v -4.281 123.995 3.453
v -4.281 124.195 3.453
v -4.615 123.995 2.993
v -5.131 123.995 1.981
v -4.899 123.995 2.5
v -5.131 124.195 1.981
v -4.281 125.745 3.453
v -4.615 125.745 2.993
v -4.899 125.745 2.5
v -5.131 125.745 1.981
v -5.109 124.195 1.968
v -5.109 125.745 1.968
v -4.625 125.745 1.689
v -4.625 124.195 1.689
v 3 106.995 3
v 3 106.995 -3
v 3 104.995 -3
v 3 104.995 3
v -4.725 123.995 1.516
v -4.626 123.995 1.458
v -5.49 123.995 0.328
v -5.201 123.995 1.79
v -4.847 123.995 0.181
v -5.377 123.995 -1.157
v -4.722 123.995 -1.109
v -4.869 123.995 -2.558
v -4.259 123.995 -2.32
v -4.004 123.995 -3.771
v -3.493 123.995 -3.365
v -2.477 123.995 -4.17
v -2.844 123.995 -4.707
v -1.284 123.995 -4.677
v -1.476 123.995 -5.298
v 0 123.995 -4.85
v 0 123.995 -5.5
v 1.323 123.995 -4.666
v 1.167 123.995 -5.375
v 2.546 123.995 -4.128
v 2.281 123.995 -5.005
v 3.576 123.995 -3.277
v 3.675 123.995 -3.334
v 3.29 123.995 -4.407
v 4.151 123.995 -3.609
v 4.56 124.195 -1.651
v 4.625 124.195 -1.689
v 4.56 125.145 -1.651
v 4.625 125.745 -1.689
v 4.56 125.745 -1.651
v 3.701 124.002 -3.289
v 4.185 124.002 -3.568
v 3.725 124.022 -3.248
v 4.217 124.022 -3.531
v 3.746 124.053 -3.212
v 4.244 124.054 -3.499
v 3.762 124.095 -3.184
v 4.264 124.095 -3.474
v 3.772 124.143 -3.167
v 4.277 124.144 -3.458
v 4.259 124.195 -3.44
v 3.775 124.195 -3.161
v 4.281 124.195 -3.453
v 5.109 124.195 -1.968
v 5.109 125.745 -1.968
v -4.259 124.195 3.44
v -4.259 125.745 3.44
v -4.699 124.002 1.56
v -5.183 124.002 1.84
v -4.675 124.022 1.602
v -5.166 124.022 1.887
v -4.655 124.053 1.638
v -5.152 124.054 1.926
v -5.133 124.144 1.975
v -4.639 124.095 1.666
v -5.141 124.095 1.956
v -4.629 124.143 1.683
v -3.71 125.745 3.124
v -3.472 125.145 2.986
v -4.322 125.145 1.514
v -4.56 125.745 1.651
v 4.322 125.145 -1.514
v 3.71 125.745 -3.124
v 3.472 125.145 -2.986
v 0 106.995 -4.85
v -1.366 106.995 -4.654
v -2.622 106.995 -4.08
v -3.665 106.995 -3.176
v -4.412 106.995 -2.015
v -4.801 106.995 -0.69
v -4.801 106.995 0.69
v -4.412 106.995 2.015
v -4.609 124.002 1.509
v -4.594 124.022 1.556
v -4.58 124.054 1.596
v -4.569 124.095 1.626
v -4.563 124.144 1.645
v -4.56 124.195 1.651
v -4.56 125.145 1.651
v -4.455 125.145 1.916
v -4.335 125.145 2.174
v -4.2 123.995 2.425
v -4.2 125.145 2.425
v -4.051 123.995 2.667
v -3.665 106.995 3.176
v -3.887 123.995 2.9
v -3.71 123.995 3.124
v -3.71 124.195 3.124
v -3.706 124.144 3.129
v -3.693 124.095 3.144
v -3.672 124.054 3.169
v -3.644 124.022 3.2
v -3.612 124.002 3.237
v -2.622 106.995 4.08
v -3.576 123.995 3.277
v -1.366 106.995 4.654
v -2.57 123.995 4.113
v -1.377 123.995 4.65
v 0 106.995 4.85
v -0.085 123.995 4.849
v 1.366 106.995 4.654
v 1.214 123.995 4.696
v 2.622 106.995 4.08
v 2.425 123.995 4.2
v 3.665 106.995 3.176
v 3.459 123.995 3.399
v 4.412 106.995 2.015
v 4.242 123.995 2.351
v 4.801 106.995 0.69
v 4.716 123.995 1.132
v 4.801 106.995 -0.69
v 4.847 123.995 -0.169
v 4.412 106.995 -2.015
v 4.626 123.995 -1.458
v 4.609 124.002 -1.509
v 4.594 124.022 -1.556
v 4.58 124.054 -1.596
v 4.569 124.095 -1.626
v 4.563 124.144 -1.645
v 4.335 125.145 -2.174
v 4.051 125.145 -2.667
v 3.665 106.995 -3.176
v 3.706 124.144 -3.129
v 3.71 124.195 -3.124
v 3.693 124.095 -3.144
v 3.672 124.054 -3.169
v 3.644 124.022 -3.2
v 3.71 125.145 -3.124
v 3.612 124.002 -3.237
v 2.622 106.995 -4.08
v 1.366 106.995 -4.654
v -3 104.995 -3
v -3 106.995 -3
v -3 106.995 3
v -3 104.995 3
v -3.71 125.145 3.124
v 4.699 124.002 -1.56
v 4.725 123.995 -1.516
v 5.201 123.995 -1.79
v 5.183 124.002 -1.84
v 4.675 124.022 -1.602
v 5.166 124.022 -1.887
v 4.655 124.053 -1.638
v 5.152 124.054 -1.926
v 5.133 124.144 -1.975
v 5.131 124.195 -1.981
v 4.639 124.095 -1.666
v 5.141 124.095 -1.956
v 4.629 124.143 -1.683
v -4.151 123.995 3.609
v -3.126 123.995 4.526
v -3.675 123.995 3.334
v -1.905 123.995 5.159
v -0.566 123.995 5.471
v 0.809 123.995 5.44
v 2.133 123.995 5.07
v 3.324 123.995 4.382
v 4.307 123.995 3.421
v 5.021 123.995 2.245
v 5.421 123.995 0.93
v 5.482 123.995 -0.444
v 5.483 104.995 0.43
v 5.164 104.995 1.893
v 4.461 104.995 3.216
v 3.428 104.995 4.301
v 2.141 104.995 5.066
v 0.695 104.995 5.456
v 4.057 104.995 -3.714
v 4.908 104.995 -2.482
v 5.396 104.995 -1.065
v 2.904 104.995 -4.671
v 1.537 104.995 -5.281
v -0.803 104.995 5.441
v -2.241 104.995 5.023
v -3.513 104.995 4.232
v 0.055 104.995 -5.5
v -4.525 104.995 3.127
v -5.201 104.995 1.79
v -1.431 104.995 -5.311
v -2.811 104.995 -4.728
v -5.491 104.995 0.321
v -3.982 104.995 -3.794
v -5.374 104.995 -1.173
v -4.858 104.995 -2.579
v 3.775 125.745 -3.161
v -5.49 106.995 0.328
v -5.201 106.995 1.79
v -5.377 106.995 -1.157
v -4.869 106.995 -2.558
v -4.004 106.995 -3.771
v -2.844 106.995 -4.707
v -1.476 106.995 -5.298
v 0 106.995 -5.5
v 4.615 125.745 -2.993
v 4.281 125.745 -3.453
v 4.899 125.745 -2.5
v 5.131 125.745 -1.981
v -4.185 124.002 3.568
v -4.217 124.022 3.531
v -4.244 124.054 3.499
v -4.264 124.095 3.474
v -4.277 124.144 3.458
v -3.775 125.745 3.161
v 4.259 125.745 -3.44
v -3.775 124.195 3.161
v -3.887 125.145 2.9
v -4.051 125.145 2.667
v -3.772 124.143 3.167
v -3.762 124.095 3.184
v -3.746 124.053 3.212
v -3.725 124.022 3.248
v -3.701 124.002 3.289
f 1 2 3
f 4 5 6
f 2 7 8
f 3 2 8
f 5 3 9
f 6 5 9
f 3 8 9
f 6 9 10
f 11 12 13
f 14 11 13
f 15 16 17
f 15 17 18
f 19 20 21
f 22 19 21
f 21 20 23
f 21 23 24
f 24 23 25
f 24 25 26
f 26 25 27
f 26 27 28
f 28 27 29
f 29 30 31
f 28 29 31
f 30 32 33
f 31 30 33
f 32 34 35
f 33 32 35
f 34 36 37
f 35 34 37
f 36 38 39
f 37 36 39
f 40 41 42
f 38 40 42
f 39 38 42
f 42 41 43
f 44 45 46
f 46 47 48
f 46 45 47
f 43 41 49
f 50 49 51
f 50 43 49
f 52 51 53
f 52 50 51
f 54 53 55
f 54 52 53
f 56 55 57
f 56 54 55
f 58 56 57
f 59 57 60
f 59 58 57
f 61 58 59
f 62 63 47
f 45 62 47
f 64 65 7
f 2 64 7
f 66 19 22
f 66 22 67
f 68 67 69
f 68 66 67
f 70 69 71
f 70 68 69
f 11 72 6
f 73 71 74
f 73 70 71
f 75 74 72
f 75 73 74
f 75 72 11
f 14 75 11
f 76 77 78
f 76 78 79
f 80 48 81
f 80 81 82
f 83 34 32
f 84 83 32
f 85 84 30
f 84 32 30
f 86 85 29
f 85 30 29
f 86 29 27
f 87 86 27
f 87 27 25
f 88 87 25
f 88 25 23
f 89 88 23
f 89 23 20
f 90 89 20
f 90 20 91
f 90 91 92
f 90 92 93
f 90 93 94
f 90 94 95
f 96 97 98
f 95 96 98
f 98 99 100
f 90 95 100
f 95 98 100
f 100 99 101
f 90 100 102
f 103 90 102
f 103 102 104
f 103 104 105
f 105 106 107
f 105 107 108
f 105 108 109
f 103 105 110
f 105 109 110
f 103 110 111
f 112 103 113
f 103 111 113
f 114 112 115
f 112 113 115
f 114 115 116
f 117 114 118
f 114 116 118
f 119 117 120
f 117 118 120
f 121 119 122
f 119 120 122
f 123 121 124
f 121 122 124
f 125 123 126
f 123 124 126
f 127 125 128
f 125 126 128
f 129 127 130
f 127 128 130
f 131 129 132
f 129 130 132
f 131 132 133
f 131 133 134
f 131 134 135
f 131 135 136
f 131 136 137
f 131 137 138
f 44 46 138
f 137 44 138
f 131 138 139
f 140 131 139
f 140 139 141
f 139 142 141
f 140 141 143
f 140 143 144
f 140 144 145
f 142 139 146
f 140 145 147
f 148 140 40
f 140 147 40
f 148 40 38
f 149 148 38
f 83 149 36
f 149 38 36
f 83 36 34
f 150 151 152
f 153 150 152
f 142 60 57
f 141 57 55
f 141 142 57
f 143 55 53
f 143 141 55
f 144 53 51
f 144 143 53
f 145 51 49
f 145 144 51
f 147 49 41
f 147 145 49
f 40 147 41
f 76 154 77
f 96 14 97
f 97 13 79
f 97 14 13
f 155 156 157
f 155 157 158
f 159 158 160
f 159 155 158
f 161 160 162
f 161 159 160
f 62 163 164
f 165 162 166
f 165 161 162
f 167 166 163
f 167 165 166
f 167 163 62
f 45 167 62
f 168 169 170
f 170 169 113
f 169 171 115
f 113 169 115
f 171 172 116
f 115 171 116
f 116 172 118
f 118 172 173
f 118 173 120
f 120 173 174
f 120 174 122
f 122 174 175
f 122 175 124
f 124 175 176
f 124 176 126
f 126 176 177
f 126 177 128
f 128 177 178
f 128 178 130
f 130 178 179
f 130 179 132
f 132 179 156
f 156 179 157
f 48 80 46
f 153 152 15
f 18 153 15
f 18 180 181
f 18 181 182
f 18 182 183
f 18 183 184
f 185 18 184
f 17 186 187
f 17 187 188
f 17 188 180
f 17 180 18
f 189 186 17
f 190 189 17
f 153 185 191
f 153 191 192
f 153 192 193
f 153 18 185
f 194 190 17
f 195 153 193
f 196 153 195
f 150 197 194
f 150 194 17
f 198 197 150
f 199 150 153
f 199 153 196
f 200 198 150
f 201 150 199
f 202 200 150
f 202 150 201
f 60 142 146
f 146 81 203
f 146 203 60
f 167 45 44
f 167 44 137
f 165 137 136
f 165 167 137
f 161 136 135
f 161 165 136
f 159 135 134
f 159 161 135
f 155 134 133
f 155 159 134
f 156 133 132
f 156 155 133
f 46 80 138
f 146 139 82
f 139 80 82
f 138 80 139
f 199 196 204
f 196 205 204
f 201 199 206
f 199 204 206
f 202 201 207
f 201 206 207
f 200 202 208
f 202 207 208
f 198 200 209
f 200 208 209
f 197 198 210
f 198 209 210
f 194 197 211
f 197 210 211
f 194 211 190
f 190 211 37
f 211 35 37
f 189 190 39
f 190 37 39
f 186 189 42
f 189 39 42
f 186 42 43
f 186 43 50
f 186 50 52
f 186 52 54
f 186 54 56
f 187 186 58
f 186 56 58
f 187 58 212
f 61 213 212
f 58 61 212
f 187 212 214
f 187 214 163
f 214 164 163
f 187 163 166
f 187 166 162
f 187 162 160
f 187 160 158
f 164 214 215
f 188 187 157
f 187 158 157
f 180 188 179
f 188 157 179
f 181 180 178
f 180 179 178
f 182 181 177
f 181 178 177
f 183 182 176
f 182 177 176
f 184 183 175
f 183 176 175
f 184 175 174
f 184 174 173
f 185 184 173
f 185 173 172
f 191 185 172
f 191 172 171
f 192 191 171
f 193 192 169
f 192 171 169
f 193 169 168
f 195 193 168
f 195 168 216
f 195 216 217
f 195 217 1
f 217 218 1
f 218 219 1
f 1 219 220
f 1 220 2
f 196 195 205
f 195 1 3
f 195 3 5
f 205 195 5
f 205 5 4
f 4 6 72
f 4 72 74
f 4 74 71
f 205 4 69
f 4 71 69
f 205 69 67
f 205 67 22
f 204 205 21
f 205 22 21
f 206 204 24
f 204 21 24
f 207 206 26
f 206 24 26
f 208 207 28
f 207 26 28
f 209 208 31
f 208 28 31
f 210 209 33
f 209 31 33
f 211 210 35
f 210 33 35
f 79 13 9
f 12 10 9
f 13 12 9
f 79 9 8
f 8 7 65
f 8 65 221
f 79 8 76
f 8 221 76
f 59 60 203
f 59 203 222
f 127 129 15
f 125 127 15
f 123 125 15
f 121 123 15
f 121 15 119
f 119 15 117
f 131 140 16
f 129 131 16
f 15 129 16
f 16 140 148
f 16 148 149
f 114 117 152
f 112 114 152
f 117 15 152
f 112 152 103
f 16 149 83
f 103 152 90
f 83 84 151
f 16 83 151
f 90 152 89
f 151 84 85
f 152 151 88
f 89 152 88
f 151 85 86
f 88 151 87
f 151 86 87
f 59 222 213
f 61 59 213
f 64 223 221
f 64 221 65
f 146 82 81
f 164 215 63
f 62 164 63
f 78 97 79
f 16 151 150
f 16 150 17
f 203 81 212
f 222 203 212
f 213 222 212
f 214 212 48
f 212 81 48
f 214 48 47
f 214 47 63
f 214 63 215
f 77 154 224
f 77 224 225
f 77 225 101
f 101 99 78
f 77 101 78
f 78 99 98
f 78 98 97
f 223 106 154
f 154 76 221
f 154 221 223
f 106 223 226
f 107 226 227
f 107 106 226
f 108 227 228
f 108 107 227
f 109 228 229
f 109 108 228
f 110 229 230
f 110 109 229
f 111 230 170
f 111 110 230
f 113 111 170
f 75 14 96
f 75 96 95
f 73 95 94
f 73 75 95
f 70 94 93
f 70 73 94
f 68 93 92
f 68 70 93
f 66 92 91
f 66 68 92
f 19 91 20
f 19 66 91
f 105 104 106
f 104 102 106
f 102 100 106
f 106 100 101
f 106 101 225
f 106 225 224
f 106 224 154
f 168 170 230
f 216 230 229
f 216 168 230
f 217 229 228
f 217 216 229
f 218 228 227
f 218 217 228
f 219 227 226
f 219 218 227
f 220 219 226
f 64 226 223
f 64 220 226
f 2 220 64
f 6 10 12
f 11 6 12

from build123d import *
from build123d.topology import SkipClean

# Parameters (mm, degrees)
SKETCH1_R                = 5.5
SKETCH1_R_2              = 4.85
BOSS_EXTRUDE1_DEPTH      = 17
BOSS_EXTRUDE2_START      = -1.75
BOSS_EXTRUDE2_DEPTH      = 1.75
BOSS_EXTRUDE3_DEPTH      = 1.7
BOSS_EXTRUDE3_2_DEPTH    = 1.7
BOSS_EXTRUDE4_REACH      = 128.36
BOSS_EXTRUDE4_END_RADIUS = 4.85
SKETCH3_W                = 1.7
SKETCH3_H                = 0.6
BOSS_EXTRUDE5_START      = -9.624935
SKETCH3_2_W              = 1.7
SKETCH3_2_H              = 0.6
BOSS_EXTRUDE5_DEPTH      = 0.075066
FILLET1_R                = 0.2
BOSS_EXTRUDE6_START      = 17
SKETCH1_4_R              = 5.5
SKETCH1_4_W              = 6
SKETCH1_4_H              = 6
BOSS_EXTRUDE6_DEPTH      = 2


with BuildPart() as part:
    # Sketch1 → Boss-Extrude1 (new body)
    with BuildSketch(Plane.XZ.offset(-123.994845224)):
        with Locations(Location((0, 0, 0), (0, 0, 270))):
            Circle(SKETCH1_R)
        with Locations(Location((0, 0, 0), (0, 0, 270))):
            Circle(SKETCH1_R_2, mode=Mode.SUBTRACT)
    extrude(amount=BOSS_EXTRUDE1_DEPTH)

    # Sketch1<3> → Boss-Extrude2 (add)
    with SkipClean():  # the faces are left unmerged after this step: merging them gives an invalid solid
        with BuildSketch(Plane.XZ.offset(-123.994845224).offset(BOSS_EXTRUDE2_START)):
            with BuildLine():
                ThreePointArc((4.280924301, -3.453069233), (4.763148058, -2.74998556), (5.130919838, -1.98082347))
                Line((5.130919838, -1.98082347), (5.108754465, -1.968026376))
                Line((5.108754465, -1.968026376), (4.625228328, -1.688864385))
                Line((4.625228328, -1.688864385), (4.20023564, -2.424978467))
                Line((4.20023564, -2.424978467), (3.775232792, -3.161110148))
                Line((3.775232792, -3.161110148), (4.258758928, -3.440272139))
                Line((4.258758928, -3.440272139), (4.280924301, -3.453069233))
            make_face()
            with BuildLine():
                Line((-3.775232792, 3.161110148), (-4.258758928, 3.440272139))
                Line((-4.258758928, 3.440272139), (-4.280924301, 3.453069233))
                ThreePointArc((-4.280924301, 3.453069233), (-4.763148058, 2.74998556), (-5.130919838, 1.98082347))
                Line((-5.130919838, 1.98082347), (-5.108754465, 1.968026376))
                Line((-5.108754465, 1.968026376), (-4.625228328, 1.688864385))
                Line((-4.625228328, 1.688864385), (-4.200235262, 2.424979122))
                Line((-4.200235262, 2.424979122), (-3.775232792, 3.161110148))
            make_face()
            with BuildLine():
                Line((4.625228328, -1.688864385), (4.560219632, -1.651331859))
                ThreePointArc((4.560219632, -1.651331859), (4.397274885, -2.046087385), (4.20023564, -2.424978467))
                Line((4.20023564, -2.424978467), (4.625228328, -1.688864385))
            make_face()
            with BuildLine():
                ThreePointArc((4.20023564, -2.424978467), (3.970623818, -2.785075672), (3.710224095, -3.123577623))
                Line((3.710224095, -3.123577623), (3.775232792, -3.161110148))
                Line((3.775232792, -3.161110148), (4.20023564, -2.424978467))
            make_face()
            with BuildLine():
                ThreePointArc((-4.560219632, 1.651331859), (-4.397274725, 2.046087728), (-4.200235262, 2.424979122))
                Line((-4.200235262, 2.424979122), (-4.625228328, 1.688864385))
                Line((-4.625228328, 1.688864385), (-4.560219632, 1.651331859))
            make_face()
            with BuildLine():
                Line((-3.710224095, 3.123577623), (-3.775232792, 3.161110148))
                Line((-3.775232792, 3.161110148), (-4.200235262, 2.424979122))
                ThreePointArc((-4.200235262, 2.424979122), (-3.970623601, 2.785075982), (-3.710224095, 3.123577623))
            make_face()
        extrude(amount=BOSS_EXTRUDE2_DEPTH)



with BuildPart() as body_2:
    # Sketch2 → Boss-Extrude3 (new body)
    with BuildSketch(Plane(origin=(0.424997768, 0, 0.736122882), x_dir=(0.866026919582721, 0, -0.49999737455117027), z_dir=(0.49999737455117027, 0, 0.866026919582721))):
        Polygon((4.5, 125.144845224), (4.774934555, 125.144845224), (4.774934555, 125.744845224), align=None)
    extrude(amount=-BOSS_EXTRUDE3_DEPTH)


with BuildPart() as body_3:
    # Sketch2 → Boss-Extrude3 2 (new body)
    with BuildSketch(Plane(origin=(0.424997768, 0, 0.736122882), x_dir=(0.866026919582721, 0, -0.49999737455117027), z_dir=(0.49999737455117027, 0, 0.866026919582721))):
        Polygon((-4.5, 125.144845224), (-4.774934555, 125.744845224), (-4.774934555, 125.144845224), align=None)
    extrude(amount=-BOSS_EXTRUDE3_2_DEPTH)


with BuildPart() as part_1:
    with SkipClean():  # the faces are left unmerged after this step: merging them gives an invalid solid
        add(part.part)

        add(body_2.part)  # Boss-Extrude4 merges body 2
        # Boss-Extrude4: up to this cylinder (the profile starts inside it)
        boss_extrude4_end = Plane(origin=(0, 125.444845, 0), z_dir=(0, 1, 0)) * Cylinder(BOSS_EXTRUDE4_END_RADIUS, 267.42, mode=Mode.PRIVATE)
        # Sketch3 → Boss-Extrude4 (add, up to the surface)
        with BuildSketch(Plane(origin=(4.135221863, 0, -2.387454741), x_dir=(-0.4999973745511703, 0, -0.866026919582721), z_dir=(0.866026919582721, 0, -0.4999973745511703)), mode=Mode.PRIVATE) as boss_extrude4_sk1:
            with Locations((0, 125.444845224)):
                Rectangle(SKETCH3_W, SKETCH3_H)
        boss_extrude4_tool1 = extrude(boss_extrude4_sk1.sketch, amount=BOSS_EXTRUDE4_REACH, mode=Mode.PRIVATE) & boss_extrude4_end
        add(boss_extrude4_tool1.solids().sort_by_distance((4.135222, 125.444845, -2.387455))[0])


    with SkipClean():  # the faces are left unmerged after this step: merging them gives an invalid solid
        add(body_3.part)  # Boss-Extrude5 merges body 3
        # Sketch3<2> → Boss-Extrude5 (add)
        with BuildSketch(Plane(origin=(4.135221863, 0, -2.387454741), x_dir=(-0.4999973745511703, 0, -0.866026919582721), z_dir=(0.866026919582721, 0, -0.4999973745511703)).offset(BOSS_EXTRUDE5_START)):
            with Locations((0, 125.444845224)):
                Rectangle(SKETCH3_2_W, SKETCH3_2_H)
        extrude(amount=BOSS_EXTRUDE5_DEPTH)

    # Fillet1
    # the kernel refuses this fillet: 0.2 mm, written as the material it adds along each edge
    with BuildSketch(Plane(origin=(-4.713937761, 123.994845224, 3.70306792), x_dir=(0.49999737455195337, 0, 0.866026919582269), z_dir=(0.866026919582269, 0, -0.4999973745519534))) as fillet1_piece_1_section:
        with BuildLine():
            CenterArc((FILLET1_R, -FILLET1_R), FILLET1_R, 90, 90)
            Line((0, -FILLET1_R), (0, 0))
            Line((0, 0), (FILLET1_R, 0))
        make_face()
    fillet1_piece_1 = extrude(amount=1.083921236, mode=Mode.PRIVATE)
    fillet1_piece_1 = fillet1_piece_1 & Plane(origin=(0, 124.040443489, 0), x_dir=(0, 0, -1), z_dir=(0, 1, 0)) * Cylinder(5.5, 3, mode=Mode.PRIVATE)
    add(fillet1_piece_1)
    with BuildSketch(Plane(origin=(4.713937761, 123.994845224, -3.70306792), x_dir=(-0.49999737455261106, 0, -0.8660269195818893), z_dir=(-0.8660269195818893, 0, 0.4999973745526111))) as fillet1_piece_2_section:
        with BuildLine():
            CenterArc((FILLET1_R, -FILLET1_R), FILLET1_R, 90, 90)
            Line((0, -FILLET1_R), (0, 0))
            Line((0, 0), (FILLET1_R, 0))
        make_face()
    fillet1_piece_2 = extrude(amount=1.083921236, mode=Mode.PRIVATE)
    fillet1_piece_2 = fillet1_piece_2 & Plane(origin=(0, 124.040443489, 0), x_dir=(0, 0, -1), z_dir=(0, 1, 0)) * Cylinder(5.5, 3, mode=Mode.PRIVATE)
    add(fillet1_piece_2)
    with BuildSketch(Plane(origin=(-4.625228328, 123.994845224, 1.688864385), x_dir=(-0.49999737454985904, 0, -0.866026919583478), z_dir=(-0.8660269195834781, 0, 0.49999737454985904))) as fillet1_piece_3_section:
        with BuildLine():
            CenterArc((FILLET1_R, -FILLET1_R), FILLET1_R, 90, 90)
            Line((0, -FILLET1_R), (0, 0))
            Line((0, 0), (FILLET1_R, 0))
        make_face()
    fillet1_piece_3 = extrude(amount=1.083921236, mode=Mode.PRIVATE)
    fillet1_piece_3 = fillet1_piece_3 & Plane(origin=(0, 124.040443489, 0), x_dir=(0, 0, -1), z_dir=(0, 1, 0)) * Cylinder(5.5, 3, mode=Mode.PRIVATE)
    add(fillet1_piece_3)
    with BuildSketch(Plane(origin=(4.625228328, 123.994845224, -1.688864385), x_dir=(0.4999973745501742, 0, 0.866026919583296), z_dir=(0.8660269195832961, 0, -0.49999737455017423))) as fillet1_piece_4_section:
        with BuildLine():
            CenterArc((FILLET1_R, -FILLET1_R), FILLET1_R, 90, 90)
            Line((0, -FILLET1_R), (0, 0))
            Line((0, 0), (FILLET1_R, 0))
        make_face()
    fillet1_piece_4 = extrude(amount=1.083921236, mode=Mode.PRIVATE)
    fillet1_piece_4 = fillet1_piece_4 & Plane(origin=(0, 124.040443489, 0), x_dir=(0, 0, -1), z_dir=(0, 1, 0)) * Cylinder(5.5, 3, mode=Mode.PRIVATE)
    add(fillet1_piece_4)
    with BuildSketch(Plane(origin=(4.625228328, 123.994845224, -1.688864385), x_dir=(0.4999973745511805, 0, 0.8660269195827152), z_dir=(-0.8660269195827152, 0, 0.49999737455118054))) as fillet1_piece_5_section:
        with BuildLine():
            CenterArc((FILLET1_R, FILLET1_R), FILLET1_R, 180, 90)
            Line((0, FILLET1_R), (0, 0))
            Line((0, 0), (FILLET1_R, 0))
        make_face()
    fillet1_piece_5 = extrude(amount=0.575065445, mode=Mode.PRIVATE)
    fillet1_piece_5 = fillet1_piece_5 - Plane(origin=(0, 124.037616214, 0), x_dir=(0, 0, -1), z_dir=(0, 1, 0)) * Cylinder(4.85, 2, mode=Mode.PRIVATE)
    add(fillet1_piece_5)
    with BuildSketch(Plane(origin=(-4.625228328, 123.994845224, 1.688864385), x_dir=(-0.49999737455107873, 0, -0.8660269195827739), z_dir=(0.8660269195827739, 0, -0.49999737455107884))) as fillet1_piece_6_section:
        with BuildLine():
            CenterArc((FILLET1_R, FILLET1_R), FILLET1_R, 180, 90)
            Line((0, FILLET1_R), (0, 0))
            Line((0, 0), (FILLET1_R, 0))
        make_face()
    fillet1_piece_6 = extrude(amount=0.575065445, mode=Mode.PRIVATE)
    fillet1_piece_6 = fillet1_piece_6 - Plane(origin=(0, 124.037616214, 0), x_dir=(0, 0, -1), z_dir=(0, 1, 0)) * Cylinder(4.85, 2, mode=Mode.PRIVATE)
    add(fillet1_piece_6)
    with BuildSketch(Plane(origin=(3.277210635, 123.994845224, -2.873578935), x_dir=(-0.49999737455115034, 0, -0.8660269195827325), z_dir=(0.8660269195827326, 0, -0.49999737455115034))) as fillet1_piece_7_section:
        with BuildLine():
            CenterArc((FILLET1_R, FILLET1_R), FILLET1_R, 180, 90)
            Line((0, FILLET1_R), (0, 0))
            Line((0, 0), (FILLET1_R, 0))
        make_face()
    fillet1_piece_7 = extrude(amount=0.575065445, mode=Mode.PRIVATE)
    fillet1_piece_7 = fillet1_piece_7 - Plane(origin=(0, 124.037616214, 0), x_dir=(0, 0, -1), z_dir=(0, 1, 0)) * Cylinder(4.85, 2, mode=Mode.PRIVATE)
    add(fillet1_piece_7)
    with BuildSketch(Plane(origin=(-3.277210635, 123.994845224, 2.873578935), x_dir=(0.4999973745510395, 0, 0.8660269195827964), z_dir=(-0.8660269195827965, 0, 0.49999737455103954))) as fillet1_piece_8_section:
        with BuildLine():
            CenterArc((FILLET1_R, FILLET1_R), FILLET1_R, 180, 90)
            Line((0, FILLET1_R), (0, 0))
            Line((0, 0), (FILLET1_R, 0))
        make_face()
    fillet1_piece_8 = extrude(amount=0.575065445, mode=Mode.PRIVATE)
    fillet1_piece_8 = fillet1_piece_8 - Plane(origin=(0, 124.037616214, 0), x_dir=(0, 0, -1), z_dir=(0, 1, 0)) * Cylinder(4.85, 2, mode=Mode.PRIVATE)
    add(fillet1_piece_8)

    # Sketch1<4> → Boss-Extrude6 (add)
    with BuildSketch(Plane.XZ.offset(-123.994845224).offset(BOSS_EXTRUDE6_START)):
        with Locations(Location((0, 0, 0), (0, 0, 161.006016149))):
            Circle(SKETCH1_4_R)
        Rectangle(SKETCH1_4_W, SKETCH1_4_H, mode=Mode.SUBTRACT)
    extrude(amount=BOSS_EXTRUDE6_DEPTH)


solid = part_1.part
